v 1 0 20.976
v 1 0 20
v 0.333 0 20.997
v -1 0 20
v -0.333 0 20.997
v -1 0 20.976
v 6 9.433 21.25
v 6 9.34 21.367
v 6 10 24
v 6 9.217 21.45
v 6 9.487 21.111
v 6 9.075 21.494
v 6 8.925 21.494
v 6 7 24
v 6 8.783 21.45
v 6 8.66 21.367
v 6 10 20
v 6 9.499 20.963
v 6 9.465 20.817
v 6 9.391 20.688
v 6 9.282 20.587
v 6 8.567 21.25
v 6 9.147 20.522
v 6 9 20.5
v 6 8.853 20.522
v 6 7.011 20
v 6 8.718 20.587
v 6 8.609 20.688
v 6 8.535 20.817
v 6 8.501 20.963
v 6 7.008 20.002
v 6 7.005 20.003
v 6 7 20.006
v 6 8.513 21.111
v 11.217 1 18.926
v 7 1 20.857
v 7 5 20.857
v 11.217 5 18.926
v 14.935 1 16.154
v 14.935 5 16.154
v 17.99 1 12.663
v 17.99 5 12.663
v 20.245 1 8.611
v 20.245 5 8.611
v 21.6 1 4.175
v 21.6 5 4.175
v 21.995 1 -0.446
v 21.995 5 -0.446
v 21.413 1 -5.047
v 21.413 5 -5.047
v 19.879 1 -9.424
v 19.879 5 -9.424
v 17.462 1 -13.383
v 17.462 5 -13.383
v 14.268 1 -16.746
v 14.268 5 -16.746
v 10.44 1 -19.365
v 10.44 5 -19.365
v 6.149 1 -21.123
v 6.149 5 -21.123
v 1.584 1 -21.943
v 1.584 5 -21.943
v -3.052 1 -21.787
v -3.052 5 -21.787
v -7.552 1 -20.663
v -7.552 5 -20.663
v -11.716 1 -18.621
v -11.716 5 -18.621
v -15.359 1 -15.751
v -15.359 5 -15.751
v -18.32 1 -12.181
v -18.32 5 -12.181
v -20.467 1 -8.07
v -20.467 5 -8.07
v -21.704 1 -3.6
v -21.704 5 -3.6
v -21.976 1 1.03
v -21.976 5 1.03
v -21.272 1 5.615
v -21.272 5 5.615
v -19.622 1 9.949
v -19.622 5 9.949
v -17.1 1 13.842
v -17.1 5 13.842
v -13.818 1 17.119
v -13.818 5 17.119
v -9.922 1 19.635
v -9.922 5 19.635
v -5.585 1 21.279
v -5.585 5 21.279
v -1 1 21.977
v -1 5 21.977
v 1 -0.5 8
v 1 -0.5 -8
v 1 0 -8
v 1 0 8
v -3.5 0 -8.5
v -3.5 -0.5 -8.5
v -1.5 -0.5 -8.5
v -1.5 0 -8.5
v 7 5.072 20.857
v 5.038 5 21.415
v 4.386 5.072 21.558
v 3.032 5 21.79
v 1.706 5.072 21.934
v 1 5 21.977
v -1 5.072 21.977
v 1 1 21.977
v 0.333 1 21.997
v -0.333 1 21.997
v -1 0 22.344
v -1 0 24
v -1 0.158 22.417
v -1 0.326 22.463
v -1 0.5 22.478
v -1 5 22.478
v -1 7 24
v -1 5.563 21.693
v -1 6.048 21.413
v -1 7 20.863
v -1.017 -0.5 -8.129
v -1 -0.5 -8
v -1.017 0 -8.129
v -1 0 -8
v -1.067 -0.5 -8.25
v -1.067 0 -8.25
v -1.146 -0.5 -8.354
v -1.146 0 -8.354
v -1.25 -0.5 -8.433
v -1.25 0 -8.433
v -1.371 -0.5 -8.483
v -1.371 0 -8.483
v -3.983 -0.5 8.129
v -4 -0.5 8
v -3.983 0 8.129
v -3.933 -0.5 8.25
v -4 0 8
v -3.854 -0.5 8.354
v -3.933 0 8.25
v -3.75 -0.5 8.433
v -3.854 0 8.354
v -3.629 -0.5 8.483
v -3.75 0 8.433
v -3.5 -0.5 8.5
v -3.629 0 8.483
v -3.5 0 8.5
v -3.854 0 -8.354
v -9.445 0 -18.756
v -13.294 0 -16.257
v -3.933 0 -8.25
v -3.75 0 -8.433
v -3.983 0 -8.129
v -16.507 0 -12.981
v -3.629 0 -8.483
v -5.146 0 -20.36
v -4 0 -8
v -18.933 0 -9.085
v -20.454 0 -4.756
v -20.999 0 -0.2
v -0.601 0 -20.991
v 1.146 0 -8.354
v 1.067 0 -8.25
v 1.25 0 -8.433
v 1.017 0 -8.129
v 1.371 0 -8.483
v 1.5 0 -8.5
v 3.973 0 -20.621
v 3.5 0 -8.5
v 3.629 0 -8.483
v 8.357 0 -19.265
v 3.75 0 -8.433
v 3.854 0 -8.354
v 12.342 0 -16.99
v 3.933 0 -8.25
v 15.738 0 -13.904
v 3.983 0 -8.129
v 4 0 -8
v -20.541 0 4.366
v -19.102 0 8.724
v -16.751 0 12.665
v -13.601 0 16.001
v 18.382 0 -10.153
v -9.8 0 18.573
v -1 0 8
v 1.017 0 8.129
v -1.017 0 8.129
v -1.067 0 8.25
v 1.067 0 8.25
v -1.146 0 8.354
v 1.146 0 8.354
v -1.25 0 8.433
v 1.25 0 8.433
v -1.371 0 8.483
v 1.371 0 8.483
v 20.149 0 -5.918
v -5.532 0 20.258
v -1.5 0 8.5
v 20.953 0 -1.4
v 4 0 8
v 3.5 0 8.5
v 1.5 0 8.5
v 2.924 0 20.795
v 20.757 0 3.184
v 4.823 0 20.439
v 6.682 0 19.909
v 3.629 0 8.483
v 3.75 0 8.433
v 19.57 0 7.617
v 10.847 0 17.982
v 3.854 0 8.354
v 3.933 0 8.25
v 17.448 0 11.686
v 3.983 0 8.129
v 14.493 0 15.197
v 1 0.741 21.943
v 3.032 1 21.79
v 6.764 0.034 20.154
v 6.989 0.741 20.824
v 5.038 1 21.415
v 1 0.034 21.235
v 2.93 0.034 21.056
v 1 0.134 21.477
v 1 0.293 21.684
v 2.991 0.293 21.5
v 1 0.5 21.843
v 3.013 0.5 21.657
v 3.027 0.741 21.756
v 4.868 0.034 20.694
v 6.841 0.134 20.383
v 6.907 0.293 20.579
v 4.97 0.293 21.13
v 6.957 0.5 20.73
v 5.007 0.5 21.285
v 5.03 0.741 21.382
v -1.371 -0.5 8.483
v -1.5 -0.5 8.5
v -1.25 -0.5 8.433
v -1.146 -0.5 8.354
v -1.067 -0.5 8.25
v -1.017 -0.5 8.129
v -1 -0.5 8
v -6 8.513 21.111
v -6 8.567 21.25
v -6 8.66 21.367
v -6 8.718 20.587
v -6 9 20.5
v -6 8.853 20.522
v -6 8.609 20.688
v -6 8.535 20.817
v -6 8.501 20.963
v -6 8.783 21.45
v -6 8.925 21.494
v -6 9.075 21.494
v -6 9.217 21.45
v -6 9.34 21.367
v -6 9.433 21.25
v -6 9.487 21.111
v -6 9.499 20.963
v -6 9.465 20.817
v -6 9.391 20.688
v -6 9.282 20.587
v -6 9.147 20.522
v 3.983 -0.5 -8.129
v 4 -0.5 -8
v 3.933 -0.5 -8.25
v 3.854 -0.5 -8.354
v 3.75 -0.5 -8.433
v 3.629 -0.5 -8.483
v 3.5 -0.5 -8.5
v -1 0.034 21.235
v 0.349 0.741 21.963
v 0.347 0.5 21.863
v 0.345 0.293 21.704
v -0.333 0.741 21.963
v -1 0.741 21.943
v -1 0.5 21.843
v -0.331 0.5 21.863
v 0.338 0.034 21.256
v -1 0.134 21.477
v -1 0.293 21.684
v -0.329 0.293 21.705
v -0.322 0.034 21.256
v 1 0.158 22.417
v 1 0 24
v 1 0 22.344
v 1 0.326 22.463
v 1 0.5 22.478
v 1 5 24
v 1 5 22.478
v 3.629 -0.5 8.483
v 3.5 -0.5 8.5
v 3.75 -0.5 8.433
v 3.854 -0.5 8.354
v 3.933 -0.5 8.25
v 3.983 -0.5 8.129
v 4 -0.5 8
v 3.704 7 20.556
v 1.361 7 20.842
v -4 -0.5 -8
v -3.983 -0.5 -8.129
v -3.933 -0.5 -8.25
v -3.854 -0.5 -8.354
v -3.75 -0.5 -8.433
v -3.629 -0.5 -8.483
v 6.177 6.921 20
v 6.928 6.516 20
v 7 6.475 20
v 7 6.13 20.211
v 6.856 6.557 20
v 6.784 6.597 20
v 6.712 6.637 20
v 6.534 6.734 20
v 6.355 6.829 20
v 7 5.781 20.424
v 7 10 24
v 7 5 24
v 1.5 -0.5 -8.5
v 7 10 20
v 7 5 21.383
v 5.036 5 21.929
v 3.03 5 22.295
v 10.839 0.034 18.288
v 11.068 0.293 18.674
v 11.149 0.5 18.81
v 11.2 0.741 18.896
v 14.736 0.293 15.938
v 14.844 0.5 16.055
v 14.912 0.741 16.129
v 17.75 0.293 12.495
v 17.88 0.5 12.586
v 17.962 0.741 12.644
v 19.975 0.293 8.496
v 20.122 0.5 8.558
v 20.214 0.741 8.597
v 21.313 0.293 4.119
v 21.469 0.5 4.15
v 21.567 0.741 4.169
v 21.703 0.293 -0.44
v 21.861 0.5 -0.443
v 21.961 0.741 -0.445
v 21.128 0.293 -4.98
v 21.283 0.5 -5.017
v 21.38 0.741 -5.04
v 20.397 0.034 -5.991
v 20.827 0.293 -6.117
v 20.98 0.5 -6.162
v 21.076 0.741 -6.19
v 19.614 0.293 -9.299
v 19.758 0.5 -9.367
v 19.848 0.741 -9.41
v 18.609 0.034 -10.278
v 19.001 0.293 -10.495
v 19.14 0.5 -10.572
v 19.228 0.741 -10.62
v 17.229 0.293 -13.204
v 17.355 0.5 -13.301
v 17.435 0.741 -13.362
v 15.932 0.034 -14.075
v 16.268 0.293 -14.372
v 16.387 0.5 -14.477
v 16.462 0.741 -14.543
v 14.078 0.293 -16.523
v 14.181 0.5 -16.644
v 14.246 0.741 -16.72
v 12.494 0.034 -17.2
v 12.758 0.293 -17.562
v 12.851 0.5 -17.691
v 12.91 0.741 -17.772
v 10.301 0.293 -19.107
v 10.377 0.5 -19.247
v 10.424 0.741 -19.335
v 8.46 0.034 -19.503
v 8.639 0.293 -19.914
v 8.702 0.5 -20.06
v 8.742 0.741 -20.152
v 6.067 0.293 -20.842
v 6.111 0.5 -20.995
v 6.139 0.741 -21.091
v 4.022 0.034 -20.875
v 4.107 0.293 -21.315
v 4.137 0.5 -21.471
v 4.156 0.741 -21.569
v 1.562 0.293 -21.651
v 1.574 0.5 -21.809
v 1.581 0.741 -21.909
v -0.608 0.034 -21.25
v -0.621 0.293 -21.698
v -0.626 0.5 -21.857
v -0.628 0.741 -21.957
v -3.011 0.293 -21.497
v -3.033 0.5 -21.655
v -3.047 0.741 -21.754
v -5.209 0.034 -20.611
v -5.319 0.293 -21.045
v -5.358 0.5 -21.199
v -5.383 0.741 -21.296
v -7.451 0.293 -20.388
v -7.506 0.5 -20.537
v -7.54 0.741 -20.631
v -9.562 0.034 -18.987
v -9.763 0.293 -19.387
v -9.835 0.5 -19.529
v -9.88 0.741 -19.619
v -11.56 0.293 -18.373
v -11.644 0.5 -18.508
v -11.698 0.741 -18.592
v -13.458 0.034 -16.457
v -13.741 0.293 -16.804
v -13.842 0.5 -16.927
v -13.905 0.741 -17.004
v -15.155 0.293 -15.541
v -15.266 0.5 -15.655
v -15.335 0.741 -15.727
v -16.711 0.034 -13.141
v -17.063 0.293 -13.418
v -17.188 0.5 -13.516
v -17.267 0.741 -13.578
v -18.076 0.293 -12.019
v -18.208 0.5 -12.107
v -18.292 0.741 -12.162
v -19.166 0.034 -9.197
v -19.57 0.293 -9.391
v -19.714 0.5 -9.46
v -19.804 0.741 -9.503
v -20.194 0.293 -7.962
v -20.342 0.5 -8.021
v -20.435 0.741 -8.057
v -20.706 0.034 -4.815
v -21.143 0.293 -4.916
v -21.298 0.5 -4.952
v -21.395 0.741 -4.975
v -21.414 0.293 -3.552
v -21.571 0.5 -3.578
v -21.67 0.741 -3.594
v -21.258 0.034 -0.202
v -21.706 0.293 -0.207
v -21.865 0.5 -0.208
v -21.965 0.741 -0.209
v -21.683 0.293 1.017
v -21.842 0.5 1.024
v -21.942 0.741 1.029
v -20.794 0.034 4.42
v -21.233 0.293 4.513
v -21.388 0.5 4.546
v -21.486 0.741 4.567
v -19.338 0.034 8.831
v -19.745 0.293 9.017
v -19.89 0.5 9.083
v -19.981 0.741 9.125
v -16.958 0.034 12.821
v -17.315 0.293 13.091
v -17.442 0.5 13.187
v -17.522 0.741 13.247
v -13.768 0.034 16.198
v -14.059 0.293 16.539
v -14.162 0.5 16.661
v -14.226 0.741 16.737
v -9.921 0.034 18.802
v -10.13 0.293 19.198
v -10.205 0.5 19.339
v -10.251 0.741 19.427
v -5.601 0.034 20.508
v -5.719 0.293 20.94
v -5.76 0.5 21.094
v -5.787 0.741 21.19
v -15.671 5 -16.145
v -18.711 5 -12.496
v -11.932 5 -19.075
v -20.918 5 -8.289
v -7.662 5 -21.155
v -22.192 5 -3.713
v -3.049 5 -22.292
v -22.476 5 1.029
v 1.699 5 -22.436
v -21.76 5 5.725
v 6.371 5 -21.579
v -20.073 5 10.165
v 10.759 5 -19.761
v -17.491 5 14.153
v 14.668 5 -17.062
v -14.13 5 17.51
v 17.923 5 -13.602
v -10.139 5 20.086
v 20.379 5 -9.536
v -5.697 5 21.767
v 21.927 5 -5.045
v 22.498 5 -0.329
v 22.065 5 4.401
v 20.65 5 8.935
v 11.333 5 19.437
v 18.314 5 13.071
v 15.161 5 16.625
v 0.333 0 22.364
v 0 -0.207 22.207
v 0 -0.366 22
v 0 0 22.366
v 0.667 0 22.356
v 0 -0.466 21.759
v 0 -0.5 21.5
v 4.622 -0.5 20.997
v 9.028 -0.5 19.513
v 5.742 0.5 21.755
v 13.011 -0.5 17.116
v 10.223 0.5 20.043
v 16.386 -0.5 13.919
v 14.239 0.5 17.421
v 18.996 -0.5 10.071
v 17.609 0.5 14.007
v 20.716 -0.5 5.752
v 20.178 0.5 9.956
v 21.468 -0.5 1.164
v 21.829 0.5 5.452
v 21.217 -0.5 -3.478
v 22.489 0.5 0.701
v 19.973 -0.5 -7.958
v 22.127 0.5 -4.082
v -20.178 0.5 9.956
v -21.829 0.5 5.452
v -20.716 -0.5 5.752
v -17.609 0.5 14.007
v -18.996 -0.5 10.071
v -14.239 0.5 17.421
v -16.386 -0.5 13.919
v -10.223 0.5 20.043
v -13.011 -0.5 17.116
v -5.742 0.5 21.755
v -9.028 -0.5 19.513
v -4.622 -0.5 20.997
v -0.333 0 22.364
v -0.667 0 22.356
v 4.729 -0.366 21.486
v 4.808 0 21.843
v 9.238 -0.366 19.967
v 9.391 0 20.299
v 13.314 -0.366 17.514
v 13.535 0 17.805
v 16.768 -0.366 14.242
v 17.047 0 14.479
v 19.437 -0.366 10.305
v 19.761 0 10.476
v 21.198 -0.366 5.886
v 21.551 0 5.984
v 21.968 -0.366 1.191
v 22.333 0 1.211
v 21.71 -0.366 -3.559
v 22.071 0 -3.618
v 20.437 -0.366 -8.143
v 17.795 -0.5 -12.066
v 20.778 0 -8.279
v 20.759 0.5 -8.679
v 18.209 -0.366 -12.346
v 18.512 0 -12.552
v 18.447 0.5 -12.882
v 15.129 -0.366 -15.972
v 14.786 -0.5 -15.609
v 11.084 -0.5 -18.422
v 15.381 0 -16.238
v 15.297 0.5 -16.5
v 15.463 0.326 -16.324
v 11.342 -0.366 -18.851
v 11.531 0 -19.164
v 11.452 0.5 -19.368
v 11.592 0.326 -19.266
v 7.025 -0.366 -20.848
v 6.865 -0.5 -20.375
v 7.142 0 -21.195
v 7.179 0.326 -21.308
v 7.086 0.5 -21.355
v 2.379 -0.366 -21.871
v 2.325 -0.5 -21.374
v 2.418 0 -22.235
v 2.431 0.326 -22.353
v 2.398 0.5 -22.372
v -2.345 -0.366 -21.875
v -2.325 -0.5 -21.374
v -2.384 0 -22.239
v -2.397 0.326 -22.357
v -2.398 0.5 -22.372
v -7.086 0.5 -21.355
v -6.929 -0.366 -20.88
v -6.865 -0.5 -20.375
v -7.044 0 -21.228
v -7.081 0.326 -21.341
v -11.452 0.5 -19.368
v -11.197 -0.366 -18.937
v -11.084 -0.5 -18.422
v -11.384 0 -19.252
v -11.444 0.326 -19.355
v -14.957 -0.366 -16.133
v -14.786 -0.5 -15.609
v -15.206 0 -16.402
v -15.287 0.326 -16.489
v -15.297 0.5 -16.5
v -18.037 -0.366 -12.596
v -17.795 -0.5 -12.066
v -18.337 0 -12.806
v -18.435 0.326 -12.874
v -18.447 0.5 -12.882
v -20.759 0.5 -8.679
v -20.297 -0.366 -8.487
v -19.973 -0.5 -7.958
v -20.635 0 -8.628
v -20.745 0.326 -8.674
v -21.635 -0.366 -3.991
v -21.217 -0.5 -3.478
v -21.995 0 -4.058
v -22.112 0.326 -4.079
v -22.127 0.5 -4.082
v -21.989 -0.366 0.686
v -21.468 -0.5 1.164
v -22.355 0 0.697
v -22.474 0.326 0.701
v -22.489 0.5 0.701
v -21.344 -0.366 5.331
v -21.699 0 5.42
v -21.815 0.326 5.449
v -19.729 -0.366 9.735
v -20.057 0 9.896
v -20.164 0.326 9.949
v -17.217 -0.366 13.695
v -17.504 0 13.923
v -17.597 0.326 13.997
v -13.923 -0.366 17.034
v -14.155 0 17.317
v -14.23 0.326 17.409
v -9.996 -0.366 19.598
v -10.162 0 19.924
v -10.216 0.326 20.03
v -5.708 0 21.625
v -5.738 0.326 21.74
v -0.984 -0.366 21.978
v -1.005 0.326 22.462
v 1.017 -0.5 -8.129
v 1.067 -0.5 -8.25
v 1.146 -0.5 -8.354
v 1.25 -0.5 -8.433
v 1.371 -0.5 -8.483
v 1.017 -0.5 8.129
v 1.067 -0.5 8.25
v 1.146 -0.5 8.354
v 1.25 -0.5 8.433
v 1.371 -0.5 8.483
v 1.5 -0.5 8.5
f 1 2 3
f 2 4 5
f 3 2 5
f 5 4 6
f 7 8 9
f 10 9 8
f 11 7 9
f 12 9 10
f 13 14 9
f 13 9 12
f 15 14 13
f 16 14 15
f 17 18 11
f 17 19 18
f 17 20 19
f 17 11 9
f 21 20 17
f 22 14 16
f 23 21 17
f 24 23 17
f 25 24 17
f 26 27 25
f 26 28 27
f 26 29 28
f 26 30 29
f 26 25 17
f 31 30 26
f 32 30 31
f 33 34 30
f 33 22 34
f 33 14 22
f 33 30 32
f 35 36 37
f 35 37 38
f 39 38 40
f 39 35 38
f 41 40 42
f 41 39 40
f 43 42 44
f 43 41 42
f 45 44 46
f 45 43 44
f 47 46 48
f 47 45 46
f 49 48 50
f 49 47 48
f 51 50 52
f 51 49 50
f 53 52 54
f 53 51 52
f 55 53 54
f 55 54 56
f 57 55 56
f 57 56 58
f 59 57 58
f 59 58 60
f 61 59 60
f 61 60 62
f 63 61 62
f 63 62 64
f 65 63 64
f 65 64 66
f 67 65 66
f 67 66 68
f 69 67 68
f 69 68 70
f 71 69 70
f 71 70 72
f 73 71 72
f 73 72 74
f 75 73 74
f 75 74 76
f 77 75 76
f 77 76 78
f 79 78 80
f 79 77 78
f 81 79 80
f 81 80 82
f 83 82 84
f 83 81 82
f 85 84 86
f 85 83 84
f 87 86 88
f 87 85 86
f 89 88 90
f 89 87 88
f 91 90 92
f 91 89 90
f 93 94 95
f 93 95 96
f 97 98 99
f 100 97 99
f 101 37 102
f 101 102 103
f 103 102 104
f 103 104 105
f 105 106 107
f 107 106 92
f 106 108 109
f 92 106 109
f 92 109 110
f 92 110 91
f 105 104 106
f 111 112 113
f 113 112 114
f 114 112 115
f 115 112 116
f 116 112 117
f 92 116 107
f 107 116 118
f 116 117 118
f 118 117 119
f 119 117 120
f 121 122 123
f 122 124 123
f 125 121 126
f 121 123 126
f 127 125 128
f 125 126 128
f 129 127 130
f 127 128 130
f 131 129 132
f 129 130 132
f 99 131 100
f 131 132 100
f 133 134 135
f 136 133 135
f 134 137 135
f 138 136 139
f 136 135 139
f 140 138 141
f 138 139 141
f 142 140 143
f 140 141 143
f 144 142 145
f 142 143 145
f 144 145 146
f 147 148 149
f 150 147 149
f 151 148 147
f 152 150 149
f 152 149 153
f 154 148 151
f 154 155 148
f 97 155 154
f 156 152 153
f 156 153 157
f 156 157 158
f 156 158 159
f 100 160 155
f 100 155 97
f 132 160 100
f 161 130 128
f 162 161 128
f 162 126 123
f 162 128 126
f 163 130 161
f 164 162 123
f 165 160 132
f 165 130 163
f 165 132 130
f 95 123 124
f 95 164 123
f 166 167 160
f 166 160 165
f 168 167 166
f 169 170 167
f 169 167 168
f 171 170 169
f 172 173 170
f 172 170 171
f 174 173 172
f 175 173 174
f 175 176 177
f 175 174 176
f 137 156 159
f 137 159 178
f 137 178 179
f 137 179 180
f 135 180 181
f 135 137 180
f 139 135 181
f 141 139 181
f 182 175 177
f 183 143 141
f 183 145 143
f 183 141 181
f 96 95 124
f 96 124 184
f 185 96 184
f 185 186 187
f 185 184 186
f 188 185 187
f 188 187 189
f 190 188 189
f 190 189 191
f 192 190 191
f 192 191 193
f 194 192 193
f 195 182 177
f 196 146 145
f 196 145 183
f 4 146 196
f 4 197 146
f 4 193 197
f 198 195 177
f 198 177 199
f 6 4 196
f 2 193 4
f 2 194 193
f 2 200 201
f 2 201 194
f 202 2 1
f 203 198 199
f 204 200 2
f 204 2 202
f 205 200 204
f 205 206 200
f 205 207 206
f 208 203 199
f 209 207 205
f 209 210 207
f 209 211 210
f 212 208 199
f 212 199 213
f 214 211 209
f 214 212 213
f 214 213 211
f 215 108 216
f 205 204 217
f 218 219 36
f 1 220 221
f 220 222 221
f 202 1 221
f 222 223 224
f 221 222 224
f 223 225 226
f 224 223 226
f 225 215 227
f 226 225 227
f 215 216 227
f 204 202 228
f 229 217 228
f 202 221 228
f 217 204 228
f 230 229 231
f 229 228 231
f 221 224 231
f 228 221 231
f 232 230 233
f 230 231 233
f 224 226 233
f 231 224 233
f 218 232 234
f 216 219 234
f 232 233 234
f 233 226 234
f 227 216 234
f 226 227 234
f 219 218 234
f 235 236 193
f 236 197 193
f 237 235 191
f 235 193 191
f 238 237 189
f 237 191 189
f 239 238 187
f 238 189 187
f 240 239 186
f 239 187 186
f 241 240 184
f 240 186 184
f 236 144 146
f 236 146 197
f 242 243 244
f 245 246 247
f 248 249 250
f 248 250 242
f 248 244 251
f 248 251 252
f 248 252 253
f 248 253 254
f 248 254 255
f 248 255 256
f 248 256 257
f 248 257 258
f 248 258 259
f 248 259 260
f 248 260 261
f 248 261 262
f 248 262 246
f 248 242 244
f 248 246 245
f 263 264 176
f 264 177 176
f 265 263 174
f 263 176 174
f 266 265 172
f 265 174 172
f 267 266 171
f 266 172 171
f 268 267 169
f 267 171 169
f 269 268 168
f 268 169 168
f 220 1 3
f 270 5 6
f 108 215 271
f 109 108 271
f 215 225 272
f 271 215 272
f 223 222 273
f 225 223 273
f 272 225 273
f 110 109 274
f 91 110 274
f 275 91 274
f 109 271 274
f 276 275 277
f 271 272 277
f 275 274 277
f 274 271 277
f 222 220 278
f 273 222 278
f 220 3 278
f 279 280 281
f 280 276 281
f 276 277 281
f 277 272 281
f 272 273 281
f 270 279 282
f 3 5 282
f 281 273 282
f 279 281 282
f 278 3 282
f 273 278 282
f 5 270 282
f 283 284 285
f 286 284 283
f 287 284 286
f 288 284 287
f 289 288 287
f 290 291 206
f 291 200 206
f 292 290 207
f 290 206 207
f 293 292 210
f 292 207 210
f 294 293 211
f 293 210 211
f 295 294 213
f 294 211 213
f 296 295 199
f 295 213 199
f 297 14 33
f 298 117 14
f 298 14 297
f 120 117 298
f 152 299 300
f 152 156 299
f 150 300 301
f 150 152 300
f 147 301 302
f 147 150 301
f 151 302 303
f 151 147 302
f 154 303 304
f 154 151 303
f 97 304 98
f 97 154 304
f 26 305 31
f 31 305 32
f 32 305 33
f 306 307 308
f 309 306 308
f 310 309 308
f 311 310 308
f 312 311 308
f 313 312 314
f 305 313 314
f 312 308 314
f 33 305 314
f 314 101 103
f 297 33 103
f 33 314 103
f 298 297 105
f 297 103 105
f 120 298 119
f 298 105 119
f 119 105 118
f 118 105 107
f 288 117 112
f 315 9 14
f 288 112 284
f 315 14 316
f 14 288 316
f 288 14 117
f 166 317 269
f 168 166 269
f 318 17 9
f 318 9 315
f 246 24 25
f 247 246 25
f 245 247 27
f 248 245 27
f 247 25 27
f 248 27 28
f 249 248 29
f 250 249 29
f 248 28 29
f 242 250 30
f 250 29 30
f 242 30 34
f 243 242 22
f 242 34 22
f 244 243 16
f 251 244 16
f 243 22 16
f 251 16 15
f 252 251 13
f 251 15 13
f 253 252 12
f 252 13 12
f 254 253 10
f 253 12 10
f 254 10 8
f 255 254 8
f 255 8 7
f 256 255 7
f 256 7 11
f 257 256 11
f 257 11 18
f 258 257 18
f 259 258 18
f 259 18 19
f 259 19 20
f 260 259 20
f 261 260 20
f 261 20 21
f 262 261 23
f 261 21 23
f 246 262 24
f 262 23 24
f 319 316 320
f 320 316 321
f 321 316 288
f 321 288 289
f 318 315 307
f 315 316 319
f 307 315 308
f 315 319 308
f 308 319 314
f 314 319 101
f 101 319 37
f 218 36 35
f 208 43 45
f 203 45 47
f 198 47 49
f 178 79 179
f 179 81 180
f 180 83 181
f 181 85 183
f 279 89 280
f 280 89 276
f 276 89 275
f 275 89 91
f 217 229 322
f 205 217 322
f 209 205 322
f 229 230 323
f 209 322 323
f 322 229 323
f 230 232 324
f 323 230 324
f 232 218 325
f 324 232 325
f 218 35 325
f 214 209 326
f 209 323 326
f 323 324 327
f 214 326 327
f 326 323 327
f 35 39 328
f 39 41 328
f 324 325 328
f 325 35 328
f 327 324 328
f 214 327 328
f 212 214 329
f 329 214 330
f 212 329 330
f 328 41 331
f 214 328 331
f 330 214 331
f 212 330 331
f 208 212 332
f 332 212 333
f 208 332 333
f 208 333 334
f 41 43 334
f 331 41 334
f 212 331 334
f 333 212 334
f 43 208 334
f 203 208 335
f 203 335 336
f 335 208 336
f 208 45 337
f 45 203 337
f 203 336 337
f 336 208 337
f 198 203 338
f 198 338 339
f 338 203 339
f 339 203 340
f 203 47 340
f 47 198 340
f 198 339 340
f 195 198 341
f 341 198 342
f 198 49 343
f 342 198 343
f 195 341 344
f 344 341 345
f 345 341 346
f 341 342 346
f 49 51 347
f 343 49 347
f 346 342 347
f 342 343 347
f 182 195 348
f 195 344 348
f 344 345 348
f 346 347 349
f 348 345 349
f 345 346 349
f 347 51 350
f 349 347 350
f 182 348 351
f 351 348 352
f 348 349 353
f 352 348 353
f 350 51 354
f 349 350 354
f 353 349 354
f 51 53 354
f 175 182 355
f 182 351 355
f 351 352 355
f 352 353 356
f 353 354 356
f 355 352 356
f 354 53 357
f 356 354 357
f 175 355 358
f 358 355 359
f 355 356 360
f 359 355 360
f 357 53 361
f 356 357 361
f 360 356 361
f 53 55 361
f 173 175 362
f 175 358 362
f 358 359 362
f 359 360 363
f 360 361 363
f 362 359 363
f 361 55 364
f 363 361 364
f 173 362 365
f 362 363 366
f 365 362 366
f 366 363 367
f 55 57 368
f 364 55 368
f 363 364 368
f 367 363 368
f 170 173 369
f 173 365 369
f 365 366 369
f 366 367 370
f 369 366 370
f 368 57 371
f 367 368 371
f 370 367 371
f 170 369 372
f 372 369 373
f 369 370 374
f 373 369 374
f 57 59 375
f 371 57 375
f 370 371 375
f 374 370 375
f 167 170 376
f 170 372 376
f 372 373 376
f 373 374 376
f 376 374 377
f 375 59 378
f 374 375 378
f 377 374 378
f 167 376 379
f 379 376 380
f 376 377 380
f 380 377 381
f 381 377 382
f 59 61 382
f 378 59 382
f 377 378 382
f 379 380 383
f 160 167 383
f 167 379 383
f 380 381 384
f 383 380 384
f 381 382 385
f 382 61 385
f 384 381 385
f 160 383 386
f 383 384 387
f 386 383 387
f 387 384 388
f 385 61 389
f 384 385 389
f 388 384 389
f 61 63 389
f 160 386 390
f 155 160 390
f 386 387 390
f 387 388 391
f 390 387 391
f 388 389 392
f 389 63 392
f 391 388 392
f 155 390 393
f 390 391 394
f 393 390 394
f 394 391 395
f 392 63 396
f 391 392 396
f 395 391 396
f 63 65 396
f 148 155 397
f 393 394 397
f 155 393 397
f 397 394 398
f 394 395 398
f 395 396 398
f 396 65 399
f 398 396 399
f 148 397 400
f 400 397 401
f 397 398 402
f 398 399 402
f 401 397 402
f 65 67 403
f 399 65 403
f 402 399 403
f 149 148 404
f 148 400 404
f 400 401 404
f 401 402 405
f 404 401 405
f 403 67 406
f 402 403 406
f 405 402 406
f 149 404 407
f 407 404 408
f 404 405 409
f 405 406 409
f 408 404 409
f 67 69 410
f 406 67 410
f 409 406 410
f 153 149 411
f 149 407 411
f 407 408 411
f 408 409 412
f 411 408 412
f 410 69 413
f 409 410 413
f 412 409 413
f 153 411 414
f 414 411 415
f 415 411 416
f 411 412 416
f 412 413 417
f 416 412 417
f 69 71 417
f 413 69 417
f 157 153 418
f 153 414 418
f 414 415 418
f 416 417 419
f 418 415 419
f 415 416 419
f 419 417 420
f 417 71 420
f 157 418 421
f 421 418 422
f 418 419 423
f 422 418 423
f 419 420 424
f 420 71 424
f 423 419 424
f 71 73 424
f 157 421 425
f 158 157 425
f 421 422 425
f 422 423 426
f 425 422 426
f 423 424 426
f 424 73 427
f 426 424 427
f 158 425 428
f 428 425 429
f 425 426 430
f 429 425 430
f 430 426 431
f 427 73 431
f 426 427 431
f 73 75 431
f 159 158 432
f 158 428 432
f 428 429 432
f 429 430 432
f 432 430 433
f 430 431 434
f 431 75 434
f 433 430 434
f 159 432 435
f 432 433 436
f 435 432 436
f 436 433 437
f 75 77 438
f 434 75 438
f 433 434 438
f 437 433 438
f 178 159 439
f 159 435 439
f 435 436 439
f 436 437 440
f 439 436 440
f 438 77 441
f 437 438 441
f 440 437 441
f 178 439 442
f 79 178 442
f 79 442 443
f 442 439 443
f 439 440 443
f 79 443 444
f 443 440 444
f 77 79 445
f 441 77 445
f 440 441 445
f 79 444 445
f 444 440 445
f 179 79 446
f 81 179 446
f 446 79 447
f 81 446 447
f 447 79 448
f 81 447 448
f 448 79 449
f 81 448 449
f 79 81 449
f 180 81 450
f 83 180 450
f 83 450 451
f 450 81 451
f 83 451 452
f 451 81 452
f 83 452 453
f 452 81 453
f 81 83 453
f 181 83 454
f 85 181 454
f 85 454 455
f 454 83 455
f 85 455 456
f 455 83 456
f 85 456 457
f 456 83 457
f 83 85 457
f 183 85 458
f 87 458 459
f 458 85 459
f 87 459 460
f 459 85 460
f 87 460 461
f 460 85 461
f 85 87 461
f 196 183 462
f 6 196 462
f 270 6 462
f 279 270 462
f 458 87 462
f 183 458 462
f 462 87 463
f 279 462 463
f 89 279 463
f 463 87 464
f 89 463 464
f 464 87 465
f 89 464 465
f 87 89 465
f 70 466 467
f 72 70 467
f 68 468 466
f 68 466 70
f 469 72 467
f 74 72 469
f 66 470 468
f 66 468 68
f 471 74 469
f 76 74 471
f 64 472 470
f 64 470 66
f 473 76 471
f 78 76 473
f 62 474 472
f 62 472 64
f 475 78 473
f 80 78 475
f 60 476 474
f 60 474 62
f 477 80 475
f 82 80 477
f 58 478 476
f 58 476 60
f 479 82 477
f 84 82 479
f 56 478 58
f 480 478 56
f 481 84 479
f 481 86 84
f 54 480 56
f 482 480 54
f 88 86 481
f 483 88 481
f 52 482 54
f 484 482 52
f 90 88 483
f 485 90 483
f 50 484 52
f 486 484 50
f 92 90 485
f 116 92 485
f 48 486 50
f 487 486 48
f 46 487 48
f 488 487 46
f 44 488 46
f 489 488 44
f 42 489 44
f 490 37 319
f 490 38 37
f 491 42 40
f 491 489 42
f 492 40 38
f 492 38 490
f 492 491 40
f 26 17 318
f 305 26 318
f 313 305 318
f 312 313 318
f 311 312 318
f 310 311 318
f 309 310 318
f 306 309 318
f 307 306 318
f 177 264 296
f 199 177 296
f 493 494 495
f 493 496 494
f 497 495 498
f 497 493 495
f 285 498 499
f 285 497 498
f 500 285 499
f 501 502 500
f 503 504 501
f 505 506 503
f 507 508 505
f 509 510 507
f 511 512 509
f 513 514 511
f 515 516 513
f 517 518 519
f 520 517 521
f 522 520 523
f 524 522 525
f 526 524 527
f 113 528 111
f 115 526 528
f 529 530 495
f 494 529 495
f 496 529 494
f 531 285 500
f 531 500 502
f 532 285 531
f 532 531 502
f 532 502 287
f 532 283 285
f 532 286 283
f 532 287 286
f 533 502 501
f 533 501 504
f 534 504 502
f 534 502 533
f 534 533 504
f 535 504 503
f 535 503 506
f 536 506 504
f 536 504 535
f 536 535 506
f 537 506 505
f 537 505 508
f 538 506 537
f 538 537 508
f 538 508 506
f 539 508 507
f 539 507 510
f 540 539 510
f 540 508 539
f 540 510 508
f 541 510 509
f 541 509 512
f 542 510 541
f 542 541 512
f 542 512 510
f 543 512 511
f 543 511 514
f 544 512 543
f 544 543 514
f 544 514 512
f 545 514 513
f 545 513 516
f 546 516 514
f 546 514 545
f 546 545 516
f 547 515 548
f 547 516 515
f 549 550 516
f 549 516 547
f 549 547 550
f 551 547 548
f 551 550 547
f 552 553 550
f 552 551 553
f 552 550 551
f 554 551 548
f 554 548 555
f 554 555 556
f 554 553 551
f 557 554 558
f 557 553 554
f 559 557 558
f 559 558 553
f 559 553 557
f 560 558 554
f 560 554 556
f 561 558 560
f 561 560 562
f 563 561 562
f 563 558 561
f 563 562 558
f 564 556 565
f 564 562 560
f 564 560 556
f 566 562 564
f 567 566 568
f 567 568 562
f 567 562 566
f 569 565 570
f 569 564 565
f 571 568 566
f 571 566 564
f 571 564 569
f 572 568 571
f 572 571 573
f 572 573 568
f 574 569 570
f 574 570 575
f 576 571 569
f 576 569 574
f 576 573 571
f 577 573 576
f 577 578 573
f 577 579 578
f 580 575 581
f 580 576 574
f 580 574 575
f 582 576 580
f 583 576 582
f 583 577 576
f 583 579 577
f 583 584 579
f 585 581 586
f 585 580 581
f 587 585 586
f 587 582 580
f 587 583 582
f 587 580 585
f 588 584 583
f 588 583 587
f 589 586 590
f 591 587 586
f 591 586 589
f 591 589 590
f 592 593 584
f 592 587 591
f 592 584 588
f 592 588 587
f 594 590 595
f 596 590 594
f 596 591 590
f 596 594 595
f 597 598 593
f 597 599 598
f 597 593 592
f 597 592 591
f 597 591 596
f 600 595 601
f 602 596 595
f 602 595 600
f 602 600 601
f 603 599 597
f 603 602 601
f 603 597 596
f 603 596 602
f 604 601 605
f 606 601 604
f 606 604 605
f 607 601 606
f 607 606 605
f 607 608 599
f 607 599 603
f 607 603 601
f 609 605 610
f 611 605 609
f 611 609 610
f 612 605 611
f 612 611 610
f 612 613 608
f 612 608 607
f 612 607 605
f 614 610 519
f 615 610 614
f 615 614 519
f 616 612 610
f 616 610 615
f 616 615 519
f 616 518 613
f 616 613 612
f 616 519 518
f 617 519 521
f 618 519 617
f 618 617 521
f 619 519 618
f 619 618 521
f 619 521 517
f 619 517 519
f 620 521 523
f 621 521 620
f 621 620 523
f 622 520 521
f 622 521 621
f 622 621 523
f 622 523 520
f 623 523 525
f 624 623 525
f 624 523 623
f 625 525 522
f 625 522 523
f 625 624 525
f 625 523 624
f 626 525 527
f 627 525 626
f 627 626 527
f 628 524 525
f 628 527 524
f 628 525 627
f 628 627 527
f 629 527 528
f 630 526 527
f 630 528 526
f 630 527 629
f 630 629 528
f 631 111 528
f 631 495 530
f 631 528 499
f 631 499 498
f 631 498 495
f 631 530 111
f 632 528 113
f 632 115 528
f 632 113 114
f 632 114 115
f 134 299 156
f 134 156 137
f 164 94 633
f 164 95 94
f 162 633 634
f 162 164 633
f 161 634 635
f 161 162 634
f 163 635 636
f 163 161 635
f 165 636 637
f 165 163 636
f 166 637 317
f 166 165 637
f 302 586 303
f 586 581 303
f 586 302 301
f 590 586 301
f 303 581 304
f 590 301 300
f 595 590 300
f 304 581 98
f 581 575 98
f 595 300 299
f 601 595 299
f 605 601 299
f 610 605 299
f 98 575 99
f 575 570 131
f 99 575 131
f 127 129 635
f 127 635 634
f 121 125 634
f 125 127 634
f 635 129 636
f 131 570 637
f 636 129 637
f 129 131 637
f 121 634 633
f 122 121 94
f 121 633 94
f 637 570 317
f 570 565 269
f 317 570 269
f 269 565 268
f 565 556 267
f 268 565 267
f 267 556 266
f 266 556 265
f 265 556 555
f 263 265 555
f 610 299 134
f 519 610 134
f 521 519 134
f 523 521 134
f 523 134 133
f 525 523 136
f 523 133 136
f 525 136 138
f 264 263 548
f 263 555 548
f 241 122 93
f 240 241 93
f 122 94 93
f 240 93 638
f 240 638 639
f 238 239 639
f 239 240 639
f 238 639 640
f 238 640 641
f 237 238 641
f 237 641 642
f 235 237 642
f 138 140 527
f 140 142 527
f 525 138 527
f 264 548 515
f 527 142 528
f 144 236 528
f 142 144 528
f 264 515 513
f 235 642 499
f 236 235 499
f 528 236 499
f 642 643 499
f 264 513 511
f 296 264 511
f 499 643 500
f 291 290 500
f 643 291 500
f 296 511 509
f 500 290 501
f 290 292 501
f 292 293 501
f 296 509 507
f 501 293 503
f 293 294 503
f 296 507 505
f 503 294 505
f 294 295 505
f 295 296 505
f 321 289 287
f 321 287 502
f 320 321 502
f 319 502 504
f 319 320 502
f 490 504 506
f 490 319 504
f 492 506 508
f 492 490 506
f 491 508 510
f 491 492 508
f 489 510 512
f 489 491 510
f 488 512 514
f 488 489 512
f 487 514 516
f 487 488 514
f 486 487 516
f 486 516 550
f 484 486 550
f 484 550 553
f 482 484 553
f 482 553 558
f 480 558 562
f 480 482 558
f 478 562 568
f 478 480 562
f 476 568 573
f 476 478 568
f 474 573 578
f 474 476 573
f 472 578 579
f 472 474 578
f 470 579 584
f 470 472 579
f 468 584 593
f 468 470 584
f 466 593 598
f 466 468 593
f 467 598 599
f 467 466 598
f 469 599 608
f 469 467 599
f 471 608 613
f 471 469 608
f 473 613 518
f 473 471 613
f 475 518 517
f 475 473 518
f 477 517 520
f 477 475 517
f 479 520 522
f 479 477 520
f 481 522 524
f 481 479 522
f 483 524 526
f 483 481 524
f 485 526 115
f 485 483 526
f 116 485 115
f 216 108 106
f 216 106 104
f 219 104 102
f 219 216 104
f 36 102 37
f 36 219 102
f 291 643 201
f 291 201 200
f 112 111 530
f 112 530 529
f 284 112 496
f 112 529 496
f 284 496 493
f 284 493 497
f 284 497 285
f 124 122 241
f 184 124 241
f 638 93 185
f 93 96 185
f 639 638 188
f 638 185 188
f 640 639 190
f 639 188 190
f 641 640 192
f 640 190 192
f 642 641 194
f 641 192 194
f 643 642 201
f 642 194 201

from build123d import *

# Parameters (mm, degrees)
SKETCH1_R                = 22.5
SKETCH1_R_2              = 22
BOSS_EXTRUDE1_DEPTH      = 5
SKETCH3_R                = 22.5
BOSS_EXTRUDE2_DEPTH      = 0.5
SKETCH6_W                = 3
SKETCH6_H                = 17
CUT_EXTRUDE1_DEPTH       = 10
CUT_EXTRUDE1_DEPTH_BACK  = 10
FILLET1_R                = 0.5
FILLET3_R                = 1
SKETCH7_W                = 2
SKETCH7_H                = 4
BOSS_EXTRUDE3_DEPTH      = 2
BOSS_EXTRUDE3_DEPTH_BACK = 5
SKETCH8_W                = 4
SKETCH8_H                = 2
BOSS_EXTRUDE4_DEPTH      = 6
SKETCH9_W                = 1
SKETCH9_H                = 4
BOSS_EXTRUDE5_DEPTH      = 3
SKETCH10_R               = 0.5
BOSS_EXTRUDE6_DEPTH      = 12


with BuildPart() as part:
    # Sketch1 → Boss-Extrude1 (new body)
    with BuildSketch(Plane(origin=(0, 0, 0), x_dir=(1, 0, 0), z_dir=(0, 1, 0))):
        with Locations(Location((0, 0, 0), (0, 0, 270))):
            Circle(SKETCH1_R)
        with Locations(Location((0, 0, 0), (0, 0, 270))):
            Circle(SKETCH1_R_2, mode=Mode.SUBTRACT)
    extrude(amount=BOSS_EXTRUDE1_DEPTH)

    # Sketch3 → Boss-Extrude2 (add)
    with BuildSketch(Plane(origin=(0, 0, 0), x_dir=(1, 0, 0), z_dir=(0, 1, 0))):
        with Locations(Location((0, 0, 0), (0, 0, 270))):
            Circle(SKETCH3_R)
    extrude(amount=-BOSS_EXTRUDE2_DEPTH)

    # Sketch6 → Cut-Extrude1 (cut, two sides)
    with BuildSketch(Plane.XZ.offset(0.5)) as cut_extrude1_sk:
        with Locations((2.5, 0)):
            Rectangle(SKETCH6_W, SKETCH6_H)
        with Locations((-2.5, 0)):
            Rectangle(SKETCH6_W, SKETCH6_H)
    extrude(amount=CUT_EXTRUDE1_DEPTH, mode=Mode.SUBTRACT)
    extrude(cut_extrude1_sk.sketch, amount=-CUT_EXTRUDE1_DEPTH_BACK, mode=Mode.SUBTRACT)

    # Fillet1
    fillet1_edges = [part.edges().sort_by_distance(p)[0] for p in [
        (-4, -0.25, 8.5),
        (-4, -0.25, -8.5),
        (-1, -0.25, -8.5),
        (-1, -0.25, 8.5),
        (1, -0.25, 8.5),
        (1, -0.25, -8.5),
        (4, -0.25, -8.5),
        (4, -0.25, 8.5),
    ]]
    fillet(fillet1_edges, radius=FILLET1_R)

    # Fillet3
    fillet3_edges = [part.edges().sort_by_distance(p)[0] for p in [
        (0, 0, -22),
        (0, -0.5, -22.5),
    ]]
    fillet(fillet3_edges, radius=FILLET3_R)

    # Sketch7 → Boss-Extrude3 (add, two sides)
    with BuildSketch(Plane(origin=(0, 5, 0), x_dir=(1, 0, 0), z_dir=(0, 1, 0))) as boss_extrude3_sk:
        with Locations((0, -22)):
            Rectangle(SKETCH7_W, SKETCH7_H)
    extrude(amount=BOSS_EXTRUDE3_DEPTH)
    extrude(boss_extrude3_sk.sketch, amount=-BOSS_EXTRUDE3_DEPTH_BACK)

    # Sketch8 → Boss-Extrude4 (add)
    with BuildSketch(Plane(origin=(1, 0, 0), x_dir=(0, 0, -1), z_dir=(1, 0, 0))):
        with Locations((-22, 6)):
            Rectangle(SKETCH8_W, SKETCH8_H)
    extrude(amount=BOSS_EXTRUDE4_DEPTH)

    # Sketch9 → Boss-Extrude5 (add)
    with BuildSketch(Plane(origin=(0, 7, 0), x_dir=(1, 0, 0), z_dir=(0, 1, 0))):
        with Locations((6.5, -22)):
            Rectangle(SKETCH9_W, SKETCH9_H)
    extrude(amount=BOSS_EXTRUDE5_DEPTH)

    # Sketch10 → Boss-Extrude6 (add)
    with BuildSketch(Plane.ZY.offset(-6)):
        with Locations(Location((21, 9, 0), (0, 0, 180))):
            Circle(SKETCH10_R)
    extrude(amount=BOSS_EXTRUDE6_DEPTH)

    # Sketch12 → Cut-Revolve1 (revolve, cut)
    with BuildSketch(Plane(origin=(0, 0, 0), x_dir=(0, 0, -1), z_dir=(1, 0, 0)), mode=Mode.PRIVATE) as cut_revolve1_sk:
        with BuildLine():
            Line((-18, 12), (-22, 5.07179677))
            Line((-22, 5.07179677), (-22, 1))
            ThreePointArc((-22, 1), (-21.707106781, 0.292893219), (-21, 0))
            Line((-21, 0), (0, 0))
            Line((0, 0), (0, 12))
            Line((0, 12), (-18, 12))
        make_face()
    revolve(cut_revolve1_sk.sketch.rotate(Axis((0, 12.625, 0), (0, -1, 0)), 341.446995465), axis=Axis((0, 12.625, 0), (0, -1, 0)), mode=Mode.SUBTRACT)


solid = part.part
